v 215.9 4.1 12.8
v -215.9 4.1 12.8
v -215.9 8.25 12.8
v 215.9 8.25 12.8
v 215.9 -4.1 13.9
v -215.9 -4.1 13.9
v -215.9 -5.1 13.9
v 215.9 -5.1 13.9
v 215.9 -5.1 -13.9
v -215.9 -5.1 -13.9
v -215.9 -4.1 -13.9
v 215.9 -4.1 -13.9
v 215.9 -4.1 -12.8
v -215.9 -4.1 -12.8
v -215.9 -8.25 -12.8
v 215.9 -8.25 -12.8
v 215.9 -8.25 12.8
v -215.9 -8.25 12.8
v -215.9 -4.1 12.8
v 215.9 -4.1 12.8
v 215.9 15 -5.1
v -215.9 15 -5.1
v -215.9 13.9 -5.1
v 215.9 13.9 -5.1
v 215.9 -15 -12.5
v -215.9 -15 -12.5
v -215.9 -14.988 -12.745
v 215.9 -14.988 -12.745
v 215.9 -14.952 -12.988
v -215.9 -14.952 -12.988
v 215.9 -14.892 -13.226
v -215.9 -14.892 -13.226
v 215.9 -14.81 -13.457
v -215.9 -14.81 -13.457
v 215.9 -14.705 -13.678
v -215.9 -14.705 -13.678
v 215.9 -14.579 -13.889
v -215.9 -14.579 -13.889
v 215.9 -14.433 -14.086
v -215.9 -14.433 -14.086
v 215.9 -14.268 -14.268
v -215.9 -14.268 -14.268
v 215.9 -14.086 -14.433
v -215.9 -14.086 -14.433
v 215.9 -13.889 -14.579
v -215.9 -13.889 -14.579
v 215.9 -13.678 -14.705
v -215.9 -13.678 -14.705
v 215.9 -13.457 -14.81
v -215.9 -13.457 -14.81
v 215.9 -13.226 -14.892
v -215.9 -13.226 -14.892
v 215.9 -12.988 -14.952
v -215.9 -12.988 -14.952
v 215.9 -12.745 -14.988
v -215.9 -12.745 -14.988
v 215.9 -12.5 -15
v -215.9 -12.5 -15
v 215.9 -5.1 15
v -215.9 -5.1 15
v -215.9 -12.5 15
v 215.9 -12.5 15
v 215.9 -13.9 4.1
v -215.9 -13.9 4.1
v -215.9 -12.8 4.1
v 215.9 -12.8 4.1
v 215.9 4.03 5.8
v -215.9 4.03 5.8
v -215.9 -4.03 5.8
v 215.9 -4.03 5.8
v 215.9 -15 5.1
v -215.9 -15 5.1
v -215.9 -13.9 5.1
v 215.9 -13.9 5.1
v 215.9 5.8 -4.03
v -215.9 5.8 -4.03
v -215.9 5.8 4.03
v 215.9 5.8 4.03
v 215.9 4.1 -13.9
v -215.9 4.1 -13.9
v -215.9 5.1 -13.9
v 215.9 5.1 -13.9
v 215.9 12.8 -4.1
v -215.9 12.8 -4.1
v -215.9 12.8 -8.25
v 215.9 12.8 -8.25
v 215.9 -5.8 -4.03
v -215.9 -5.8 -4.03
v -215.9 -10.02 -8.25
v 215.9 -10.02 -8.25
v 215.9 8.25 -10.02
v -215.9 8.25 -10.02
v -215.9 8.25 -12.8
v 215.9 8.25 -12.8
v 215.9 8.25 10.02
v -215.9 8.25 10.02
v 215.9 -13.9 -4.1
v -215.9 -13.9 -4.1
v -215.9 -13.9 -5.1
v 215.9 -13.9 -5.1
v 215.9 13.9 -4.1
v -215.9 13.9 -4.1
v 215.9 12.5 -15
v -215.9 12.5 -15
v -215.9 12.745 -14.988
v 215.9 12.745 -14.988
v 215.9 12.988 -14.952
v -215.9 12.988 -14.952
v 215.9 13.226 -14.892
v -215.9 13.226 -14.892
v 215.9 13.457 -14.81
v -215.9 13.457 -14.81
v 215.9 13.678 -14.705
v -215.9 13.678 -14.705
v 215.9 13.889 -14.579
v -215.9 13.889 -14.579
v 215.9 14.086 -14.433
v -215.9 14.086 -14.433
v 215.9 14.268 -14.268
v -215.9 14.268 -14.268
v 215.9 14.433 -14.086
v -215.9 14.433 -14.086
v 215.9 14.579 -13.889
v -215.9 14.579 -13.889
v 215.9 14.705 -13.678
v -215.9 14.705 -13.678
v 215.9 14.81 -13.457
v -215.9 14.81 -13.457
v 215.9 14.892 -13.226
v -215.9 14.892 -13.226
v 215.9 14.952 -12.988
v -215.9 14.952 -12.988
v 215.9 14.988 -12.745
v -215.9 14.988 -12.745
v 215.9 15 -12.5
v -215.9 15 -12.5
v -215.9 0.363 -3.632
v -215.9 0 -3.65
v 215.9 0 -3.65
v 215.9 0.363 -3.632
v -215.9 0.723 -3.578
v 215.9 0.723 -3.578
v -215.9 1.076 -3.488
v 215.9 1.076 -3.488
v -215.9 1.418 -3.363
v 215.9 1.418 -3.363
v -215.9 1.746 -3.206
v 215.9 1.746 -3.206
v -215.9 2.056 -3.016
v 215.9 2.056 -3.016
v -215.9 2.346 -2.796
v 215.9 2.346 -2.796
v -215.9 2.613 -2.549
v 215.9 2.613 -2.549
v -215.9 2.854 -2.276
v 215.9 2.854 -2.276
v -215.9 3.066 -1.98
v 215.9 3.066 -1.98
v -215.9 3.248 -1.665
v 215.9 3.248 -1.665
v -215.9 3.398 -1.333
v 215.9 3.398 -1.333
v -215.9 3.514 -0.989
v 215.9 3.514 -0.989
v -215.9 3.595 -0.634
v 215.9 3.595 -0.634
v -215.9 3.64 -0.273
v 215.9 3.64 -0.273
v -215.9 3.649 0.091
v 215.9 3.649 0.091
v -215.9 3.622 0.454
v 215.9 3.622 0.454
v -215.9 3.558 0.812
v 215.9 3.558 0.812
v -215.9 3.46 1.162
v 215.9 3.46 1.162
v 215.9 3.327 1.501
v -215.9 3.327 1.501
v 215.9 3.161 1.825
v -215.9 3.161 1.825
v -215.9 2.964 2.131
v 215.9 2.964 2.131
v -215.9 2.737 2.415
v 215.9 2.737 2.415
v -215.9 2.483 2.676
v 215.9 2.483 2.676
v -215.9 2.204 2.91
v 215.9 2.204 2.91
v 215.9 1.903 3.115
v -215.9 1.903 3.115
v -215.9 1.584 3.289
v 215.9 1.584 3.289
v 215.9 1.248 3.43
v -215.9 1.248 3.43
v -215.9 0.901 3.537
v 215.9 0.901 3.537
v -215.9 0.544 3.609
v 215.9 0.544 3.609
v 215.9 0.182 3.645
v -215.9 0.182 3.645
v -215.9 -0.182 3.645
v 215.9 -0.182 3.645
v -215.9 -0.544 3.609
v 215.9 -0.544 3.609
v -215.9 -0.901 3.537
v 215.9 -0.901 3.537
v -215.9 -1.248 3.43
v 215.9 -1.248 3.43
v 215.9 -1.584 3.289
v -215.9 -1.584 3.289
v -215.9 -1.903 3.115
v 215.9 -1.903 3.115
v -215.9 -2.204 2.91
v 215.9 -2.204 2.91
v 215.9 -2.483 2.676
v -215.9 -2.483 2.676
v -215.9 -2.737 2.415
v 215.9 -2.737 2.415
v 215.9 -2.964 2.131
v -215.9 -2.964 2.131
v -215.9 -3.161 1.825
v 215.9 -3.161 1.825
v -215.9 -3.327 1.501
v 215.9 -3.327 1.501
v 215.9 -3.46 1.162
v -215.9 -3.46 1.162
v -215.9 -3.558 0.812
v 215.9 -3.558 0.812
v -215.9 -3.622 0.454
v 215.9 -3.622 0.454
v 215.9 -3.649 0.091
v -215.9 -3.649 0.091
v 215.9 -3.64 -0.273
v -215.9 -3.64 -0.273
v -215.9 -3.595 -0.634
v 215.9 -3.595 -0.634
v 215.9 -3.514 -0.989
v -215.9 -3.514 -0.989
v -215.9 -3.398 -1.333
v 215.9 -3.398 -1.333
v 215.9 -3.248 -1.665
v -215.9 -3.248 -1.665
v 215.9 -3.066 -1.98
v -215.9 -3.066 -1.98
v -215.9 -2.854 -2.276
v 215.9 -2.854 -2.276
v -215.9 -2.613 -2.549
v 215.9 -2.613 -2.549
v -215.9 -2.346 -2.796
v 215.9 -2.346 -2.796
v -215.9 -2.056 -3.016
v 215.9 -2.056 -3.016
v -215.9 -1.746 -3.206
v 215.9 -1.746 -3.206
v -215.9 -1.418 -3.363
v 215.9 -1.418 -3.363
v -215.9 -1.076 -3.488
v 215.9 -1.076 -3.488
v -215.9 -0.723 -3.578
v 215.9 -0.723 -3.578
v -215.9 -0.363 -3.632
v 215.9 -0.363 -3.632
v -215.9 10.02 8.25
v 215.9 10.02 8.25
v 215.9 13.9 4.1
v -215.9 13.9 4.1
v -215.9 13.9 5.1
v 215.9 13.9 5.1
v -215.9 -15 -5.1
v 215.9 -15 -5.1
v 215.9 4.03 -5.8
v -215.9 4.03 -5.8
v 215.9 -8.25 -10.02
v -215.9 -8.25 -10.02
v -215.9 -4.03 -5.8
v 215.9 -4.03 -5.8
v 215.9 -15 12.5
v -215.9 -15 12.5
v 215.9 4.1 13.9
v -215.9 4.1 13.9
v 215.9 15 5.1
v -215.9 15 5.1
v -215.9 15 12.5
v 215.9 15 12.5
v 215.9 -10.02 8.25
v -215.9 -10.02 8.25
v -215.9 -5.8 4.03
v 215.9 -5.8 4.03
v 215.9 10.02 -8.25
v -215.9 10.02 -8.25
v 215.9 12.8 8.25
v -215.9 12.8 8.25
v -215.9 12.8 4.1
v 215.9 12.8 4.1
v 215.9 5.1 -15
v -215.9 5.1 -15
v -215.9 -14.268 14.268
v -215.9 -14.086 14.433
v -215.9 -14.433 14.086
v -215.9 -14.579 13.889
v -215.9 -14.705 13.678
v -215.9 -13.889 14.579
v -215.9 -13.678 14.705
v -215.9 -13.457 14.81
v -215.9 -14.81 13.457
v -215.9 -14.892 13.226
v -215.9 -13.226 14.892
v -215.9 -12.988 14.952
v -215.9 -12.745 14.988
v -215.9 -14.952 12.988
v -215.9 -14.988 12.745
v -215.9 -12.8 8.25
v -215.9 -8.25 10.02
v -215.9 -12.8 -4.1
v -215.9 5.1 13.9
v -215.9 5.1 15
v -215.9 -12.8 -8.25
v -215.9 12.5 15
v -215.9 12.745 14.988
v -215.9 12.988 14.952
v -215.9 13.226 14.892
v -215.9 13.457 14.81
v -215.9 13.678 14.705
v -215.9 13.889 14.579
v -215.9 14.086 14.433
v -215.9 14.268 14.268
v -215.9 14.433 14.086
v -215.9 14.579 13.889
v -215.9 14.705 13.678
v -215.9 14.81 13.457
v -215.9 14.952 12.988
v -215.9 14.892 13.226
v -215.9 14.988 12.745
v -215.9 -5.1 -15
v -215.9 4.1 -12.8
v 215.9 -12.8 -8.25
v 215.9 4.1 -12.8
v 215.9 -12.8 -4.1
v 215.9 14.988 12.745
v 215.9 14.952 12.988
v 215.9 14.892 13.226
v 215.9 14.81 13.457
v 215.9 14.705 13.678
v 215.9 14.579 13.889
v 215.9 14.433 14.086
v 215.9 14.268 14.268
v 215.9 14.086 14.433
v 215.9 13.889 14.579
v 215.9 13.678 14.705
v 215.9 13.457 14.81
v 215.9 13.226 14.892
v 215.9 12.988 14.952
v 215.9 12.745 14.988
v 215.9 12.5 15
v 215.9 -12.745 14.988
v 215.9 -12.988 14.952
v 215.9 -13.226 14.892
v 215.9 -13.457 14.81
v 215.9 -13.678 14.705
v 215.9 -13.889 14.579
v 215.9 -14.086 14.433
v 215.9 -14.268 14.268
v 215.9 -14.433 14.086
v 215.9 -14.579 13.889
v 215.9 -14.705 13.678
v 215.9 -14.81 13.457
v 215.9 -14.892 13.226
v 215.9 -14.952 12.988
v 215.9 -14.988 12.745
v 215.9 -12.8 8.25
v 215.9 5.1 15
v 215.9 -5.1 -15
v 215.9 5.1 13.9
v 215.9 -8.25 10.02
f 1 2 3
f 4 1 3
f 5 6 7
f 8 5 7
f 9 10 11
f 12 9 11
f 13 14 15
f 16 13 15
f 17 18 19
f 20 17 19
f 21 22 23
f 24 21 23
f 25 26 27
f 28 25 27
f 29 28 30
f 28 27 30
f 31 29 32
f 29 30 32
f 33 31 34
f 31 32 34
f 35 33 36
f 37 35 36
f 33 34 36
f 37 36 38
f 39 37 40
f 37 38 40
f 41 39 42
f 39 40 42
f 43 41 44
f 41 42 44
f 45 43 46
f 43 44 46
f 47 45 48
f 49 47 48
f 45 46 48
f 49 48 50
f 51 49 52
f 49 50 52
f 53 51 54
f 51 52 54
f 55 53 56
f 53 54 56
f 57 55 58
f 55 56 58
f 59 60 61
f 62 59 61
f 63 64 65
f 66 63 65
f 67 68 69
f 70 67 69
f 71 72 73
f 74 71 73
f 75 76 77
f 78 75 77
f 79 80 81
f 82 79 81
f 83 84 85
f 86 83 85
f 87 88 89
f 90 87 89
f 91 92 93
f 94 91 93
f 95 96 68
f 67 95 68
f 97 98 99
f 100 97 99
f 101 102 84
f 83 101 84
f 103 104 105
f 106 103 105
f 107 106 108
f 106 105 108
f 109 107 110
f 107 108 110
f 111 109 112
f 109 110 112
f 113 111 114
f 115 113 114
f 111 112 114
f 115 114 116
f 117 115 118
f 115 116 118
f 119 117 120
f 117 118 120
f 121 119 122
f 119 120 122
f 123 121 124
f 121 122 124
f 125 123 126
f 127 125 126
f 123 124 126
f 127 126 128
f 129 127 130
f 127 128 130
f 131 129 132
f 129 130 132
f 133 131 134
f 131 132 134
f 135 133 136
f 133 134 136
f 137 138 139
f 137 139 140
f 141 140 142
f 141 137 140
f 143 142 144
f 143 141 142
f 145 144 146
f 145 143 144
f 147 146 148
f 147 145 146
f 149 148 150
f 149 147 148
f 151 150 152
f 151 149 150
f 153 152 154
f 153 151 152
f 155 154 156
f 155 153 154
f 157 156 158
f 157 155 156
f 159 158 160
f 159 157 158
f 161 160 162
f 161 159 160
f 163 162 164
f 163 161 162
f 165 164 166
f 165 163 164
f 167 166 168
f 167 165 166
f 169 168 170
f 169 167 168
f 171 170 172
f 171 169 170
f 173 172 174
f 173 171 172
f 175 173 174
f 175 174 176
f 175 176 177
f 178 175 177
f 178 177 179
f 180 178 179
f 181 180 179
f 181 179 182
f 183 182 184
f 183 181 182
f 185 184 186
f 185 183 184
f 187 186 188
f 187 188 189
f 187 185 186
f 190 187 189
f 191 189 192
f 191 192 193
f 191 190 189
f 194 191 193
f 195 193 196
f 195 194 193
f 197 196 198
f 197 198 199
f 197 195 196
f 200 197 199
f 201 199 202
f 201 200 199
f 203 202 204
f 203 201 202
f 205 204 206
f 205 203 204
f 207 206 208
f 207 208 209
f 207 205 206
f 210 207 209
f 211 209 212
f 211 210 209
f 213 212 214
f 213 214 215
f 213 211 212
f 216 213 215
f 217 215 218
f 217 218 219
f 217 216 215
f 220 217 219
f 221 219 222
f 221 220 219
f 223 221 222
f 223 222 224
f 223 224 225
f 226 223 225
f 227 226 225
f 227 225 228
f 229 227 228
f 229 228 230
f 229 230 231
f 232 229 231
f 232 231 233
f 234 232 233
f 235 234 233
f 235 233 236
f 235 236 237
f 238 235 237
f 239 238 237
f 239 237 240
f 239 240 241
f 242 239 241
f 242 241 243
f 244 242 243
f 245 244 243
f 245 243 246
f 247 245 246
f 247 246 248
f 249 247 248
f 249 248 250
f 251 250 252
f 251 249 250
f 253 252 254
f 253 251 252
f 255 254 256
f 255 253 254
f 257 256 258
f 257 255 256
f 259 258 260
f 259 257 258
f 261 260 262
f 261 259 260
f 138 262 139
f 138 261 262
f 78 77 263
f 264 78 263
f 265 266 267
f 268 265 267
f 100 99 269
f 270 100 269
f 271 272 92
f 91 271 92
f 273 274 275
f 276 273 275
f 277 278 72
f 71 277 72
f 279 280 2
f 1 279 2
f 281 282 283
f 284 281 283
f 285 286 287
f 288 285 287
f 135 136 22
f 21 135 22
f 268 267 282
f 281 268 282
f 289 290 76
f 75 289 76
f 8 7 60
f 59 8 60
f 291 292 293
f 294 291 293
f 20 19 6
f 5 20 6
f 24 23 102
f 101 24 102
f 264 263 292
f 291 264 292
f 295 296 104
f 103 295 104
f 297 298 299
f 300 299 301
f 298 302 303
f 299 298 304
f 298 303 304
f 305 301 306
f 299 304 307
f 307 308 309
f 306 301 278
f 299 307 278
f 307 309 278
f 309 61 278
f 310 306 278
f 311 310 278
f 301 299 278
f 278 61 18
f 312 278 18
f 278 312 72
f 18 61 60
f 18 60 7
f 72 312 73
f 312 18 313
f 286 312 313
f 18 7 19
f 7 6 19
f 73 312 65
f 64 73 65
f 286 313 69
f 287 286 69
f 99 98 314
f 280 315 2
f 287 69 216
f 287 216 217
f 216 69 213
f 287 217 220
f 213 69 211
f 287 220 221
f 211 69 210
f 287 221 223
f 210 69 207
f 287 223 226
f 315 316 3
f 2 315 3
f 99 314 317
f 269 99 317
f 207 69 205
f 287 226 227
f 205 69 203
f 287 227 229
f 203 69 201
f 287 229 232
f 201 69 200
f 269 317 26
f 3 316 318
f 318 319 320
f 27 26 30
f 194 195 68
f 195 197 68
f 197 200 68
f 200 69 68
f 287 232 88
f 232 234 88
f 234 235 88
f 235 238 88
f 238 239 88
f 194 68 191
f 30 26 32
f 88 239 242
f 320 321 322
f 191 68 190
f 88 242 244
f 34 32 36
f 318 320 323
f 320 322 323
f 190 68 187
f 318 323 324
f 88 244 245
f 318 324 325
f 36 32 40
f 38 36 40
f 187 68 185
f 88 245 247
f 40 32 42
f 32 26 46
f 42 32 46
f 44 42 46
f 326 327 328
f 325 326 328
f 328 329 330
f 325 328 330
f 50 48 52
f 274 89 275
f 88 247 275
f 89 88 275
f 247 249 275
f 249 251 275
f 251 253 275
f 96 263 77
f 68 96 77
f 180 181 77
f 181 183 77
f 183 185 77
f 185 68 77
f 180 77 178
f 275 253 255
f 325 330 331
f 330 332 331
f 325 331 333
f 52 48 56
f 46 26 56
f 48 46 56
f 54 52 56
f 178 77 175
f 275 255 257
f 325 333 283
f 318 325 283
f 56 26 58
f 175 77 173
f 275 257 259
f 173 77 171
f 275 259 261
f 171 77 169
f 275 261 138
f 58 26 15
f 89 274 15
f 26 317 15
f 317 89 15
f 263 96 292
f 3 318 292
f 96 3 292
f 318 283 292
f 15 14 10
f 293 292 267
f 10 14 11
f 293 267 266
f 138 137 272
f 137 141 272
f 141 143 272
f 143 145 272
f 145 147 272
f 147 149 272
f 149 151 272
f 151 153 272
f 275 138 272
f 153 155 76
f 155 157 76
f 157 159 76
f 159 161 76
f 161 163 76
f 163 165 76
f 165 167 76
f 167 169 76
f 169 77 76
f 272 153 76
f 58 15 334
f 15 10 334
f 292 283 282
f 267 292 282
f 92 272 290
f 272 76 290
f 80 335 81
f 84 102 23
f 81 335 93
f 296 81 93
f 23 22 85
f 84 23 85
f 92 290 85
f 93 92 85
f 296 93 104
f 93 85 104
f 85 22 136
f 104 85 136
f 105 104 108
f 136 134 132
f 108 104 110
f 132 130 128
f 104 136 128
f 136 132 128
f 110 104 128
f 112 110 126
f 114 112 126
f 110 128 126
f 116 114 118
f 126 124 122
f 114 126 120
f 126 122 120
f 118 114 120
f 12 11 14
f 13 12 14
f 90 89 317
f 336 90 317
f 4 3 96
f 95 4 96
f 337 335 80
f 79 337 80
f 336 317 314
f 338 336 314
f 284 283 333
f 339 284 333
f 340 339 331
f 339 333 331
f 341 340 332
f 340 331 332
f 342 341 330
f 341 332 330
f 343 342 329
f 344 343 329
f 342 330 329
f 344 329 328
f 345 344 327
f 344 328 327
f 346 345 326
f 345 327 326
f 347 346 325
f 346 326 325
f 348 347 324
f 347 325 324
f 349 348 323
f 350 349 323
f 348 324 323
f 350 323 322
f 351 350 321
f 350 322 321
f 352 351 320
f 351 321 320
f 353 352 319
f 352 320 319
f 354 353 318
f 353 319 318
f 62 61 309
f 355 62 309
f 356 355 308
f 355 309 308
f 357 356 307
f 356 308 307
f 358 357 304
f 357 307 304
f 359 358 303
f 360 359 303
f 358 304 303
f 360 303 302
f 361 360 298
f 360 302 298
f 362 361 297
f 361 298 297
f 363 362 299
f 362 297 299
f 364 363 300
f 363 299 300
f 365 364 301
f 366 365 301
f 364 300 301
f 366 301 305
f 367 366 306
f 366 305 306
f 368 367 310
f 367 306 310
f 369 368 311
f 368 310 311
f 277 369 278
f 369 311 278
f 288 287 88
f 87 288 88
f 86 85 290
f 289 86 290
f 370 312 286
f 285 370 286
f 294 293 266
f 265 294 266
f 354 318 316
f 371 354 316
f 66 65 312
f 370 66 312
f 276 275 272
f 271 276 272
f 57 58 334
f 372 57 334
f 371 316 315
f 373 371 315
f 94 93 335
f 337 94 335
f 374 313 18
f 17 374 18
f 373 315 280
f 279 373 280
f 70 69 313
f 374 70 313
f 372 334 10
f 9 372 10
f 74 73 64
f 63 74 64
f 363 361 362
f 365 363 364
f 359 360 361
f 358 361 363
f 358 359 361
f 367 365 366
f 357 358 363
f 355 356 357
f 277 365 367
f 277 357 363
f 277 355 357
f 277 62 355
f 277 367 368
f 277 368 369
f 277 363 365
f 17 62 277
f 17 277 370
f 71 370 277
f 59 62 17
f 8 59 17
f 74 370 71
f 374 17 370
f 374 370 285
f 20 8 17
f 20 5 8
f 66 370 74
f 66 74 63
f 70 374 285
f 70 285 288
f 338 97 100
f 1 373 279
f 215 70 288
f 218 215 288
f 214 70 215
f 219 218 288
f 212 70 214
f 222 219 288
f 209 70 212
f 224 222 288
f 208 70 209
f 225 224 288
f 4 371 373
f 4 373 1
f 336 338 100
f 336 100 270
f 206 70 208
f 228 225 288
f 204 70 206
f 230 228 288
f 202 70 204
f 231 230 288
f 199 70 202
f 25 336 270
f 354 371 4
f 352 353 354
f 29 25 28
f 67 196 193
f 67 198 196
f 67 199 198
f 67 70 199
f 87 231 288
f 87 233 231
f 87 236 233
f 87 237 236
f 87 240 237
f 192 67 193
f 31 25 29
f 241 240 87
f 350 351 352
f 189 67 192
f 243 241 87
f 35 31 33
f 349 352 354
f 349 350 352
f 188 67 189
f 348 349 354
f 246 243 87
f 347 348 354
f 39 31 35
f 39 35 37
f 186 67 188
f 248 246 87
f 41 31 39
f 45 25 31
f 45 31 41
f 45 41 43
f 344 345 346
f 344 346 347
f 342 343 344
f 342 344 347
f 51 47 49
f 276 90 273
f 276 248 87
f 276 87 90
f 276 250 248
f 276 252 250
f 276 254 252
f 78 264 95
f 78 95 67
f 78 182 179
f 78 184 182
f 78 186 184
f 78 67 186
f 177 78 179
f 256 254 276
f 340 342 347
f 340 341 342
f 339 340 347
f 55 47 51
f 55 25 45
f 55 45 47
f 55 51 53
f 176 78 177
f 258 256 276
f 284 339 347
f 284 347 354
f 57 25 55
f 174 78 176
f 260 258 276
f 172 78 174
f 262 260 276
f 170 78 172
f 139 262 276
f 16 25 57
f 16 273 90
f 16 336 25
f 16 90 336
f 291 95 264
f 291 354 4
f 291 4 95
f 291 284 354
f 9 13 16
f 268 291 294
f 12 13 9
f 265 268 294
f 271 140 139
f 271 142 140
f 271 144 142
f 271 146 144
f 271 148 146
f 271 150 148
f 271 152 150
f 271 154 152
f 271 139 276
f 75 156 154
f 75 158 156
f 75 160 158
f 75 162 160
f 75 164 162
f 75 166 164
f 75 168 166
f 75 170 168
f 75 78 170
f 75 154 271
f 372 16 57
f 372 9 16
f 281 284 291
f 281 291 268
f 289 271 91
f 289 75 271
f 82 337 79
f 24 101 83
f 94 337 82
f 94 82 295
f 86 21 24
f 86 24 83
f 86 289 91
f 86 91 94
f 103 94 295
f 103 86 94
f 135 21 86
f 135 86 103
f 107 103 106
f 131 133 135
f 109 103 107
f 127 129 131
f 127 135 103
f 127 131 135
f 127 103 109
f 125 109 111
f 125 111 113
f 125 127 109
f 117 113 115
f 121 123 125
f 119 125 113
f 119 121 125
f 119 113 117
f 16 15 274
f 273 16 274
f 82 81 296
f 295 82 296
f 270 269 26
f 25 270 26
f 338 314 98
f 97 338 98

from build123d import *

# Parameters (mm, degrees)
SKETCH1_R                           = 3.65
BOSCHREXROTH_BOSCH_30X30_V2_1_DEPTH = 431.8


with BuildPart() as part:
    # Sketch1 → Boschrexroth BOSCH_30X30_V2(1) (new body)
    with BuildSketch(Plane(origin=(-215.9, 0, 0), x_dir=(0, 0, -1), z_dir=(1, 0, 0))):
        with BuildLine():
            Line((0, 5.8), (-4.03, 5.8))
            Line((-4.03, 5.8), (-8.25, 10.02))
            Line((-8.25, 10.02), (-8.25, 12.8))
            Line((-8.25, 12.8), (-4.1, 12.8))
            Line((-4.1, 12.8), (-4.1, 13.9))
            Line((-4.1, 13.9), (-5.1, 13.9))
            Line((-5.1, 13.9), (-5.1, 15))
            Line((-5.1, 15), (-12.5, 15))
            ThreePointArc((-12.5, 15), (-14.267766953, 14.267766953), (-15, 12.5))
            Line((-15, 12.5), (-15, 5.1))
            Line((-15, 5.1), (-13.9, 5.1))
            Line((-13.9, 5.1), (-13.9, 4.1))
            Line((-13.9, 4.1), (-12.8, 4.1))
            Line((-12.8, 4.1), (-12.8, 8.25))
            Line((-12.8, 8.25), (-10.02, 8.25))
            Line((-10.02, 8.25), (-5.8, 4.03))
            Line((-5.8, 4.03), (-5.8, 0))
            Line((-5.8, 0), (-5.8, -4.03))
            Line((-5.8, -4.03), (-10.02, -8.25))
            Line((-10.02, -8.25), (-12.8, -8.25))
            Line((-12.8, -8.25), (-12.8, -4.1))
            Line((-12.8, -4.1), (-13.9, -4.1))
            Line((-13.9, -4.1), (-13.9, -5.1))
            Line((-13.9, -5.1), (-15, -5.1))
            Line((-15, -5.1), (-15, -12.5))
            ThreePointArc((-15, -12.5), (-14.267766953, -14.267766953), (-12.5, -15))
            Line((-12.5, -15), (-5.1, -15))
            Line((-5.1, -15), (-5.1, -13.9))
            Line((-5.1, -13.9), (-4.1, -13.9))
            Line((-4.1, -13.9), (-4.1, -12.8))
            Line((-4.1, -12.8), (-8.25, -12.8))
            Line((-8.25, -12.8), (-8.25, -10.02))
            Line((-8.25, -10.02), (-4.03, -5.8))
            Line((-4.03, -5.8), (4.03, -5.8))
            Line((4.03, -5.8), (8.25, -10.02))
            Line((8.25, -10.02), (8.25, -12.8))
            Line((8.25, -12.8), (4.1, -12.8))
            Line((4.1, -12.8), (4.1, -13.9))
            Line((4.1, -13.9), (5.1, -13.9))
            Line((5.1, -13.9), (5.1, -15))
            Line((5.1, -15), (12.5, -15))
            ThreePointArc((12.5, -15), (14.267766953, -14.267766953), (15, -12.5))
            Line((15, -12.5), (15, -5.1))
            Line((15, -5.1), (13.9, -5.1))
            Line((13.9, -5.1), (13.9, -4.1))
            Line((13.9, -4.1), (12.8, -4.1))
            Line((12.8, -4.1), (12.8, -8.25))
            Line((12.8, -8.25), (10.02, -8.25))
            Line((10.02, -8.25), (5.8, -4.03))
            Line((5.8, -4.03), (5.8, 0))
            Line((5.8, 0), (5.8, 4.03))
            Line((5.8, 4.03), (10.02, 8.25))
            Line((10.02, 8.25), (12.8, 8.25))
            Line((12.8, 8.25), (12.8, 4.1))
            Line((12.8, 4.1), (13.9, 4.1))
            Line((13.9, 4.1), (13.9, 5.1))
            Line((13.9, 5.1), (15, 5.1))
            Line((15, 5.1), (15, 12.5))
            ThreePointArc((15, 12.5), (14.267766953, 14.267766953), (12.5, 15))
            Line((12.5, 15), (5.1, 15))
            Line((5.1, 15), (5.1, 13.9))
            Line((5.1, 13.9), (4.1, 13.9))
            Line((4.1, 13.9), (4.1, 12.8))
            Line((4.1, 12.8), (8.25, 12.8))
            Line((8.25, 12.8), (8.25, 10.02))
            Line((8.25, 10.02), (4.03, 5.8))
            Line((4.03, 5.8), (0, 5.8))
        make_face()
        Circle(SKETCH1_R, mode=Mode.SUBTRACT)
    extrude(amount=BOSCHREXROTH_BOSCH_30X30_V2_1_DEPTH)


solid = part.part
